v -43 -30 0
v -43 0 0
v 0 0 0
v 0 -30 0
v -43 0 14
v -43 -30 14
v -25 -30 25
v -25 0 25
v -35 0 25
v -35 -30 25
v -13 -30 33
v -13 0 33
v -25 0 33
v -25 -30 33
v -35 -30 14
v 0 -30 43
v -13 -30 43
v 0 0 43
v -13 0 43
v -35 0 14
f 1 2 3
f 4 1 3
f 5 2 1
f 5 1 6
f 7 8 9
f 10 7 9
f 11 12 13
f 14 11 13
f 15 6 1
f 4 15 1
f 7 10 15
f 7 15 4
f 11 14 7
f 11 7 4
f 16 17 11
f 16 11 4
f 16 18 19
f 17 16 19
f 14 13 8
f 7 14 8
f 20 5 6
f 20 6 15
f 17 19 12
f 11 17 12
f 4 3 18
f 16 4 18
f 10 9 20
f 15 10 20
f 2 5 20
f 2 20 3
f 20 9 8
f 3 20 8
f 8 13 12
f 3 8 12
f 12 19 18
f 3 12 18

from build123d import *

# Parameters (mm, degrees)
F0_W     = 8
F0_H     = 14
F1_DEPTH = 30


with BuildPart() as f1:
    # F0 (on Front) → F1 (new body)
    with BuildSketch(Plane.XZ):
        with Locations((-39, 7)):
            Rectangle(F0_W, F0_H)
        Polygon((-13, 0), (0, 0), (0, 43), (-13, 43), (-13, 33), align=None)
        Polygon((-25, 0), (-13, 0), (-13, 33), (-25, 33), (-25, 25), align=None)
        Polygon((-35, 0), (-25, 0), (-25, 25), (-35, 25), (-35, 14), align=None)
    extrude(amount=F1_DEPTH)


solid = f1.part
